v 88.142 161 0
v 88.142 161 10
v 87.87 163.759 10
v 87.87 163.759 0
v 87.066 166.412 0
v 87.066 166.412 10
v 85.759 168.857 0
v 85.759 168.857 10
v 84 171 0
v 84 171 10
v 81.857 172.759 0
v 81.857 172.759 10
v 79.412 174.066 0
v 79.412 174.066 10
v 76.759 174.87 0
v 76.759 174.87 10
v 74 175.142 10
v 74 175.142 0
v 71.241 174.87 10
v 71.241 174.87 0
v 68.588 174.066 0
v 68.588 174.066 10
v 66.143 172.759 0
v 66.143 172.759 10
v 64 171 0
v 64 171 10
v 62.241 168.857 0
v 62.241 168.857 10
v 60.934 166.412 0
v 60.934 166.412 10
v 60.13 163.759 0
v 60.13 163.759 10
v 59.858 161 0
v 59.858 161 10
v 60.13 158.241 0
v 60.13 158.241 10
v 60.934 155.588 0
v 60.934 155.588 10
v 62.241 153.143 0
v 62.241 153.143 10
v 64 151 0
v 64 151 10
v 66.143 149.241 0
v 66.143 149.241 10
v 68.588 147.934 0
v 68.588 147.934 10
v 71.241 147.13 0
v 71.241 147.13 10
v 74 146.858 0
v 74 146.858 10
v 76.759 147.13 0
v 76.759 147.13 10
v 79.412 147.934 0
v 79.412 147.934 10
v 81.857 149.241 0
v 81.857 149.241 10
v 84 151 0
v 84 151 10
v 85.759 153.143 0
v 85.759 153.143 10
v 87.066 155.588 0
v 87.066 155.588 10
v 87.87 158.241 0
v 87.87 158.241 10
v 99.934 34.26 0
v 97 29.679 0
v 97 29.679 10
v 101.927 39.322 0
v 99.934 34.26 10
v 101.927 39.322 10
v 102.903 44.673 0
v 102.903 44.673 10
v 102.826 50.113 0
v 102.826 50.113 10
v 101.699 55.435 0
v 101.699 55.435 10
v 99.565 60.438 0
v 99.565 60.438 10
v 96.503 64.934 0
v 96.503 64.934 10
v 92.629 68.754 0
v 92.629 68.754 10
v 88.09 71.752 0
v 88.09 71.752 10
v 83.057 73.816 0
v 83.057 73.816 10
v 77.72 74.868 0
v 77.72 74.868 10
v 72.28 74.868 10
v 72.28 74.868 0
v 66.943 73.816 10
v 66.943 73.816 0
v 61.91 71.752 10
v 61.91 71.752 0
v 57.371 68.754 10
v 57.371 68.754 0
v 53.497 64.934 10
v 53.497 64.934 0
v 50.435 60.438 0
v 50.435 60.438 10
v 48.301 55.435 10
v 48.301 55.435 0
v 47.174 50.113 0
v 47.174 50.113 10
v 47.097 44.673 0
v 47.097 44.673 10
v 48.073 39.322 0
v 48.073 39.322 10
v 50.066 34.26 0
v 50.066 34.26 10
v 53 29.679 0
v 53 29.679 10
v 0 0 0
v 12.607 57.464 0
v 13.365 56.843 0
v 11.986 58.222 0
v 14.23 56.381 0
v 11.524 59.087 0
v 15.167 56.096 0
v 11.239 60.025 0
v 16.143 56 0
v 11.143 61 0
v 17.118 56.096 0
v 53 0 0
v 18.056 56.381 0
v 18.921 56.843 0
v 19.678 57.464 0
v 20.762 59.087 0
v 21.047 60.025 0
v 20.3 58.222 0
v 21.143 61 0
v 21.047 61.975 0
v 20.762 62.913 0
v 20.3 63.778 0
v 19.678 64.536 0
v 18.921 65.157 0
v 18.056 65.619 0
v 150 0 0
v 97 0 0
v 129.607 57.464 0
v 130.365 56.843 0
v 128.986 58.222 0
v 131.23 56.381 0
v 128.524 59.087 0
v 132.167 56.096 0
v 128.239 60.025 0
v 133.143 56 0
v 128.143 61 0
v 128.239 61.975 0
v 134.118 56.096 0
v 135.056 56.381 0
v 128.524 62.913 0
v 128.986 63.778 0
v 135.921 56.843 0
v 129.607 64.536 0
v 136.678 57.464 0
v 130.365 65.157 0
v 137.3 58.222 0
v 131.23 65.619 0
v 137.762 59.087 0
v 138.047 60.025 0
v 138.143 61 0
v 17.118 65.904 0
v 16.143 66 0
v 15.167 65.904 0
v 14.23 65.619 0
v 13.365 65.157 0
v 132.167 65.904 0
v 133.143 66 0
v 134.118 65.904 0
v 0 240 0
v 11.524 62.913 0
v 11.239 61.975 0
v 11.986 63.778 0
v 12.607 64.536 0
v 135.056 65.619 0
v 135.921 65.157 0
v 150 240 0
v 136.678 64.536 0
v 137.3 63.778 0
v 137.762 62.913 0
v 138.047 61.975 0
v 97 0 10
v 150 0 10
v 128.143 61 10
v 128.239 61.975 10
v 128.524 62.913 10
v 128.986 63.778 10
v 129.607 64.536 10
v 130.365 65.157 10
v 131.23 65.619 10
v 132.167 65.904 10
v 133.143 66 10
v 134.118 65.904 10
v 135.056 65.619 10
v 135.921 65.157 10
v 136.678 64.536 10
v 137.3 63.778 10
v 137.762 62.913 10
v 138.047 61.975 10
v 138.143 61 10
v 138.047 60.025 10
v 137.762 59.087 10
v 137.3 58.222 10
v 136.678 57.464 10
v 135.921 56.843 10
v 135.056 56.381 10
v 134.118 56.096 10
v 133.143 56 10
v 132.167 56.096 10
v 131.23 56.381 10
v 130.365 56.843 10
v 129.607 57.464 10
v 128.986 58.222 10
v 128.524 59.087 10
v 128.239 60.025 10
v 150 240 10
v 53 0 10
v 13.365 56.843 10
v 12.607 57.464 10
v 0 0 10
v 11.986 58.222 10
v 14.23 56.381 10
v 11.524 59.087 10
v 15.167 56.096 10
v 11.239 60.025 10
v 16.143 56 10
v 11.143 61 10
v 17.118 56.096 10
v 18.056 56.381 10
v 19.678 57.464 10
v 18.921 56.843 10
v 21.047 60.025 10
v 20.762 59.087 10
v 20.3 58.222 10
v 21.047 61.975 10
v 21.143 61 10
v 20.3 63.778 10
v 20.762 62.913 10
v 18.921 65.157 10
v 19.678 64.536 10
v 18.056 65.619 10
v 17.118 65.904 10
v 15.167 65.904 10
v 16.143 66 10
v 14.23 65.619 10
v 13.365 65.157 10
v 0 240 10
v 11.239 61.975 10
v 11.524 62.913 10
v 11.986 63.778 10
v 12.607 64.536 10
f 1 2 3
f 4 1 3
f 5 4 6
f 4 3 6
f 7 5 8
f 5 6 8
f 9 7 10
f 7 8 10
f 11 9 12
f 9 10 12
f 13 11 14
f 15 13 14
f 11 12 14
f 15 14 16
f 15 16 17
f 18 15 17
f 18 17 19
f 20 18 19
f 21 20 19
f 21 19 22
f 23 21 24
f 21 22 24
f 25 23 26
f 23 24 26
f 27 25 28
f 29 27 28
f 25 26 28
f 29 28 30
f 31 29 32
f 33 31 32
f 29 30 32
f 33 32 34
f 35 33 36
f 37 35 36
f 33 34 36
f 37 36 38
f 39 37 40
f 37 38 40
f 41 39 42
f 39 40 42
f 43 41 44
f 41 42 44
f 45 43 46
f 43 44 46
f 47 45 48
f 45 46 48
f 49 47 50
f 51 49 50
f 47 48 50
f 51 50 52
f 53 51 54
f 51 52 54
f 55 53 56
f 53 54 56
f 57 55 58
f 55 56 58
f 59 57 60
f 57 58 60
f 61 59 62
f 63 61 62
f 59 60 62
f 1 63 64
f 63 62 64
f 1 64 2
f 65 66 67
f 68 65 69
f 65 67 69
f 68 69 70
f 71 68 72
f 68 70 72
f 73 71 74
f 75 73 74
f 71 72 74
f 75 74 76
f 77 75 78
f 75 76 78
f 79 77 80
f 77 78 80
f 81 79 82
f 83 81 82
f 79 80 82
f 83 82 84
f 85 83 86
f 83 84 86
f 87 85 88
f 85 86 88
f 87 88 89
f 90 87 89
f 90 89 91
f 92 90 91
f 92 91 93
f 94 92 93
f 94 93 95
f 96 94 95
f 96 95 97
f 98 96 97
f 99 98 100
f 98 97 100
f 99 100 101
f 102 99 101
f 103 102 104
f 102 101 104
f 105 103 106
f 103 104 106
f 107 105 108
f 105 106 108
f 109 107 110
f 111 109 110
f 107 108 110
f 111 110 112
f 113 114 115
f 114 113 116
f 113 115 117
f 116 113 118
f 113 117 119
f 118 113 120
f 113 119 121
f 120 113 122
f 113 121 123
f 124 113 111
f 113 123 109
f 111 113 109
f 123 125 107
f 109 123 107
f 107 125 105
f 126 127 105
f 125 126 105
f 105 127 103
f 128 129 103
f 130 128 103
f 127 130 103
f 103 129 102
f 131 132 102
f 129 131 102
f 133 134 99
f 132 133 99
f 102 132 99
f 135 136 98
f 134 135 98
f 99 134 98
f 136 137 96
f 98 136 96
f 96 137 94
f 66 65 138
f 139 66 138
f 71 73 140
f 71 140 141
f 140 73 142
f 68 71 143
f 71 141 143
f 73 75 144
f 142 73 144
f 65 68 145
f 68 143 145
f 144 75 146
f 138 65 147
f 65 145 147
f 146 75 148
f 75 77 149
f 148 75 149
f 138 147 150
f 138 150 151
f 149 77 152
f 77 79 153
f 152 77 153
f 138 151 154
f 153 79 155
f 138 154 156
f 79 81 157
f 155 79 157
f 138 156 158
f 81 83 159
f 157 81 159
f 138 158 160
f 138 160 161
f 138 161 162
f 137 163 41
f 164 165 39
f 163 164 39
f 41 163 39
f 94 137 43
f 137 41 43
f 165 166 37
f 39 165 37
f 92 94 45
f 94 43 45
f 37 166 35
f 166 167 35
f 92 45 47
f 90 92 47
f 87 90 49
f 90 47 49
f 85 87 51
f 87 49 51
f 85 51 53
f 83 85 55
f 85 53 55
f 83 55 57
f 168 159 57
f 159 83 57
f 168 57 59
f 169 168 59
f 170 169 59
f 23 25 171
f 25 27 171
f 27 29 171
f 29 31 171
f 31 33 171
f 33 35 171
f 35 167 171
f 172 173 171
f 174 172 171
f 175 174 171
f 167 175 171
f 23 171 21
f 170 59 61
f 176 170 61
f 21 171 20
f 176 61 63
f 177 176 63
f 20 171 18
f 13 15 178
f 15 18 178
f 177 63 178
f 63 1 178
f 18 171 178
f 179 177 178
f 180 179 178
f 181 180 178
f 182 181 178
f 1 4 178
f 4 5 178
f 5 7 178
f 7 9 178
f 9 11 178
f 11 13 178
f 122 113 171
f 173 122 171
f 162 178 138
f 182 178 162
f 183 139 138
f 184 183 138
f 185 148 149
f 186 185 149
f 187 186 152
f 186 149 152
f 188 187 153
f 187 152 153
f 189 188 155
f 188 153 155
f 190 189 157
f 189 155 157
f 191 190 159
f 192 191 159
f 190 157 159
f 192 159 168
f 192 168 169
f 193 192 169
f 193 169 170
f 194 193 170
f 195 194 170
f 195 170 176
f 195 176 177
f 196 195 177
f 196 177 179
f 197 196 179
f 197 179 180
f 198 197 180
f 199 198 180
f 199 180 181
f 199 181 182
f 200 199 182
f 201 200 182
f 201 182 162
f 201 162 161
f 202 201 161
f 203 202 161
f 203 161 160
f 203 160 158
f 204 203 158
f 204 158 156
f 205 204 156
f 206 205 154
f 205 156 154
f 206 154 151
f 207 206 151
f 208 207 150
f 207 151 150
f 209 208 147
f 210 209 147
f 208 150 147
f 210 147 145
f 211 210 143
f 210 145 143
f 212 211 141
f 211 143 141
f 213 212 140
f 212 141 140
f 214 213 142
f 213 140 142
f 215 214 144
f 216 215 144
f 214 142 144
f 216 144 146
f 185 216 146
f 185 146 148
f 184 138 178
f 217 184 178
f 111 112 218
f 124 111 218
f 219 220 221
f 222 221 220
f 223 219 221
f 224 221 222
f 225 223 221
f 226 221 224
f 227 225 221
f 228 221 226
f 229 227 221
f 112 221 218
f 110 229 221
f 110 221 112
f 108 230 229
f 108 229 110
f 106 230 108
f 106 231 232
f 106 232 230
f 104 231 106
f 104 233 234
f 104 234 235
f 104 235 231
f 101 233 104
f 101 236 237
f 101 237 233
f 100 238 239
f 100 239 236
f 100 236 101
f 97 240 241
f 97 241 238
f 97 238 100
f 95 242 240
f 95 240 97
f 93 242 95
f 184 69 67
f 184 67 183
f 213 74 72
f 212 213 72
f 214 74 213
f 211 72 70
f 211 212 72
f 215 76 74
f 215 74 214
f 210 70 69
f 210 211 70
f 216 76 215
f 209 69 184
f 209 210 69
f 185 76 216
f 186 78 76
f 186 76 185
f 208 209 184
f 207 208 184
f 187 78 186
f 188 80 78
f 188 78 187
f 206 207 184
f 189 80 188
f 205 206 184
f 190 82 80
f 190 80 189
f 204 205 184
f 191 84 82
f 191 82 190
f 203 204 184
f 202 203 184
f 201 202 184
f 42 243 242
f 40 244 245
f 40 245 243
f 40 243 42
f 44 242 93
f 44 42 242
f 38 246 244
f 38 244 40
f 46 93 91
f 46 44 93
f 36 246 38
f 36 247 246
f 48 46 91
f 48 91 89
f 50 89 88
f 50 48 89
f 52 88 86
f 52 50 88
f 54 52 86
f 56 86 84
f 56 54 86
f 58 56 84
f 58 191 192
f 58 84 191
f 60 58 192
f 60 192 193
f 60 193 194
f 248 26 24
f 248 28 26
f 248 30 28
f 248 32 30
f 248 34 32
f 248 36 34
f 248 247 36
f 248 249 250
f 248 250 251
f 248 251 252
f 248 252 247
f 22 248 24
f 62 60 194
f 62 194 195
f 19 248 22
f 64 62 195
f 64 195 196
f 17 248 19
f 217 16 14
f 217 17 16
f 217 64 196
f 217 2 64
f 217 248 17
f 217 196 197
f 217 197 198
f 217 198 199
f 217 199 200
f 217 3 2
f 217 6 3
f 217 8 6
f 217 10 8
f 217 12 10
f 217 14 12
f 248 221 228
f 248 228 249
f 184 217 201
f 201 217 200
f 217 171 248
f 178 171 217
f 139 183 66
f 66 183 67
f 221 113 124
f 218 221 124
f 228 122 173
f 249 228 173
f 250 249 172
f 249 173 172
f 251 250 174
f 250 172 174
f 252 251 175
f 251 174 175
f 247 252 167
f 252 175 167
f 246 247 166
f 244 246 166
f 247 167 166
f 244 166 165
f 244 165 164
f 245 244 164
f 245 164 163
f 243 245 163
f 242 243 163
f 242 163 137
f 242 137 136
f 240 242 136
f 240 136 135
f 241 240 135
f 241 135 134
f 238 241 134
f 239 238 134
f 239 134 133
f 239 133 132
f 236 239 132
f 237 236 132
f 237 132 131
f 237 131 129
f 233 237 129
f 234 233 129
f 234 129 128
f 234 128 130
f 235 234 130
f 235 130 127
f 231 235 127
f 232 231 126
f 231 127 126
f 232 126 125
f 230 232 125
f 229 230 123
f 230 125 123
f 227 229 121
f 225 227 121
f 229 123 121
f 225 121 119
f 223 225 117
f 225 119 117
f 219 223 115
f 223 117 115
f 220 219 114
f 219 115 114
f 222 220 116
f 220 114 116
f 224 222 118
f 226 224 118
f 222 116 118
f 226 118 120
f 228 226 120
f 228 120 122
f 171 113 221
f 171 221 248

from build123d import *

# Parameters (mm, degrees)
ESQUISSE1_W             = 150
ESQUISSE1_H             = 240
BASE_EXTRUSION_DEPTH    = 10
ENL_V_MAT_EXTRU_1_DEPTH = 10
ESQUISSE3_R             = 14.142135624
ENL_V_MAT_EXTRU_2_DEPTH = 10
ESQUISSE4_R             = 5
ENL_V_MAT_EXTRU_3_DEPTH = 284.19604517


with BuildPart() as part:
    # Esquisse1 → Base-Extrusion (new body)
    with BuildSketch(Plane.XY):
        with Locations((75, 120)):
            Rectangle(ESQUISSE1_W, ESQUISSE1_H)
    extrude(amount=BASE_EXTRUSION_DEPTH)

    # Esquisse2 → Enlèv. mat.-Extru.1 (cut)
    with BuildSketch(Plane.XY.offset(10)):
        with BuildLine():
            Line((53, 0), (97, 0))
            Line((97, 0), (97, 29.679491924))
            ThreePointArc((97, 29.679491924), (75, 75), (53, 29.679491924))
            Line((53, 29.679491924), (53, 0))
        make_face()
    extrude(amount=-ENL_V_MAT_EXTRU_1_DEPTH, mode=Mode.SUBTRACT)

    # Esquisse3 → Enlèv. mat.-Extru.2 (cut)
    with BuildSketch(Plane.XY.offset(10)):
        with Locations((74, 161)):
            Circle(ESQUISSE3_R)
    extrude(amount=-ENL_V_MAT_EXTRU_2_DEPTH, mode=Mode.SUBTRACT)

    # Esquisse4 → Enlèv. mat.-Extru.3 (cut, through all)
    with BuildSketch(Plane(origin=(0, 0, 0), x_dir=(-1, 0, 0), z_dir=(0, 0, -1))):
        with Locations((-16.142927736, 61)):
            Circle(ESQUISSE4_R)
        with Locations((-133.142927736, 61)):
            Circle(ESQUISSE4_R)
    extrude(amount=-ENL_V_MAT_EXTRU_3_DEPTH, mode=Mode.SUBTRACT)


solid = part.part
